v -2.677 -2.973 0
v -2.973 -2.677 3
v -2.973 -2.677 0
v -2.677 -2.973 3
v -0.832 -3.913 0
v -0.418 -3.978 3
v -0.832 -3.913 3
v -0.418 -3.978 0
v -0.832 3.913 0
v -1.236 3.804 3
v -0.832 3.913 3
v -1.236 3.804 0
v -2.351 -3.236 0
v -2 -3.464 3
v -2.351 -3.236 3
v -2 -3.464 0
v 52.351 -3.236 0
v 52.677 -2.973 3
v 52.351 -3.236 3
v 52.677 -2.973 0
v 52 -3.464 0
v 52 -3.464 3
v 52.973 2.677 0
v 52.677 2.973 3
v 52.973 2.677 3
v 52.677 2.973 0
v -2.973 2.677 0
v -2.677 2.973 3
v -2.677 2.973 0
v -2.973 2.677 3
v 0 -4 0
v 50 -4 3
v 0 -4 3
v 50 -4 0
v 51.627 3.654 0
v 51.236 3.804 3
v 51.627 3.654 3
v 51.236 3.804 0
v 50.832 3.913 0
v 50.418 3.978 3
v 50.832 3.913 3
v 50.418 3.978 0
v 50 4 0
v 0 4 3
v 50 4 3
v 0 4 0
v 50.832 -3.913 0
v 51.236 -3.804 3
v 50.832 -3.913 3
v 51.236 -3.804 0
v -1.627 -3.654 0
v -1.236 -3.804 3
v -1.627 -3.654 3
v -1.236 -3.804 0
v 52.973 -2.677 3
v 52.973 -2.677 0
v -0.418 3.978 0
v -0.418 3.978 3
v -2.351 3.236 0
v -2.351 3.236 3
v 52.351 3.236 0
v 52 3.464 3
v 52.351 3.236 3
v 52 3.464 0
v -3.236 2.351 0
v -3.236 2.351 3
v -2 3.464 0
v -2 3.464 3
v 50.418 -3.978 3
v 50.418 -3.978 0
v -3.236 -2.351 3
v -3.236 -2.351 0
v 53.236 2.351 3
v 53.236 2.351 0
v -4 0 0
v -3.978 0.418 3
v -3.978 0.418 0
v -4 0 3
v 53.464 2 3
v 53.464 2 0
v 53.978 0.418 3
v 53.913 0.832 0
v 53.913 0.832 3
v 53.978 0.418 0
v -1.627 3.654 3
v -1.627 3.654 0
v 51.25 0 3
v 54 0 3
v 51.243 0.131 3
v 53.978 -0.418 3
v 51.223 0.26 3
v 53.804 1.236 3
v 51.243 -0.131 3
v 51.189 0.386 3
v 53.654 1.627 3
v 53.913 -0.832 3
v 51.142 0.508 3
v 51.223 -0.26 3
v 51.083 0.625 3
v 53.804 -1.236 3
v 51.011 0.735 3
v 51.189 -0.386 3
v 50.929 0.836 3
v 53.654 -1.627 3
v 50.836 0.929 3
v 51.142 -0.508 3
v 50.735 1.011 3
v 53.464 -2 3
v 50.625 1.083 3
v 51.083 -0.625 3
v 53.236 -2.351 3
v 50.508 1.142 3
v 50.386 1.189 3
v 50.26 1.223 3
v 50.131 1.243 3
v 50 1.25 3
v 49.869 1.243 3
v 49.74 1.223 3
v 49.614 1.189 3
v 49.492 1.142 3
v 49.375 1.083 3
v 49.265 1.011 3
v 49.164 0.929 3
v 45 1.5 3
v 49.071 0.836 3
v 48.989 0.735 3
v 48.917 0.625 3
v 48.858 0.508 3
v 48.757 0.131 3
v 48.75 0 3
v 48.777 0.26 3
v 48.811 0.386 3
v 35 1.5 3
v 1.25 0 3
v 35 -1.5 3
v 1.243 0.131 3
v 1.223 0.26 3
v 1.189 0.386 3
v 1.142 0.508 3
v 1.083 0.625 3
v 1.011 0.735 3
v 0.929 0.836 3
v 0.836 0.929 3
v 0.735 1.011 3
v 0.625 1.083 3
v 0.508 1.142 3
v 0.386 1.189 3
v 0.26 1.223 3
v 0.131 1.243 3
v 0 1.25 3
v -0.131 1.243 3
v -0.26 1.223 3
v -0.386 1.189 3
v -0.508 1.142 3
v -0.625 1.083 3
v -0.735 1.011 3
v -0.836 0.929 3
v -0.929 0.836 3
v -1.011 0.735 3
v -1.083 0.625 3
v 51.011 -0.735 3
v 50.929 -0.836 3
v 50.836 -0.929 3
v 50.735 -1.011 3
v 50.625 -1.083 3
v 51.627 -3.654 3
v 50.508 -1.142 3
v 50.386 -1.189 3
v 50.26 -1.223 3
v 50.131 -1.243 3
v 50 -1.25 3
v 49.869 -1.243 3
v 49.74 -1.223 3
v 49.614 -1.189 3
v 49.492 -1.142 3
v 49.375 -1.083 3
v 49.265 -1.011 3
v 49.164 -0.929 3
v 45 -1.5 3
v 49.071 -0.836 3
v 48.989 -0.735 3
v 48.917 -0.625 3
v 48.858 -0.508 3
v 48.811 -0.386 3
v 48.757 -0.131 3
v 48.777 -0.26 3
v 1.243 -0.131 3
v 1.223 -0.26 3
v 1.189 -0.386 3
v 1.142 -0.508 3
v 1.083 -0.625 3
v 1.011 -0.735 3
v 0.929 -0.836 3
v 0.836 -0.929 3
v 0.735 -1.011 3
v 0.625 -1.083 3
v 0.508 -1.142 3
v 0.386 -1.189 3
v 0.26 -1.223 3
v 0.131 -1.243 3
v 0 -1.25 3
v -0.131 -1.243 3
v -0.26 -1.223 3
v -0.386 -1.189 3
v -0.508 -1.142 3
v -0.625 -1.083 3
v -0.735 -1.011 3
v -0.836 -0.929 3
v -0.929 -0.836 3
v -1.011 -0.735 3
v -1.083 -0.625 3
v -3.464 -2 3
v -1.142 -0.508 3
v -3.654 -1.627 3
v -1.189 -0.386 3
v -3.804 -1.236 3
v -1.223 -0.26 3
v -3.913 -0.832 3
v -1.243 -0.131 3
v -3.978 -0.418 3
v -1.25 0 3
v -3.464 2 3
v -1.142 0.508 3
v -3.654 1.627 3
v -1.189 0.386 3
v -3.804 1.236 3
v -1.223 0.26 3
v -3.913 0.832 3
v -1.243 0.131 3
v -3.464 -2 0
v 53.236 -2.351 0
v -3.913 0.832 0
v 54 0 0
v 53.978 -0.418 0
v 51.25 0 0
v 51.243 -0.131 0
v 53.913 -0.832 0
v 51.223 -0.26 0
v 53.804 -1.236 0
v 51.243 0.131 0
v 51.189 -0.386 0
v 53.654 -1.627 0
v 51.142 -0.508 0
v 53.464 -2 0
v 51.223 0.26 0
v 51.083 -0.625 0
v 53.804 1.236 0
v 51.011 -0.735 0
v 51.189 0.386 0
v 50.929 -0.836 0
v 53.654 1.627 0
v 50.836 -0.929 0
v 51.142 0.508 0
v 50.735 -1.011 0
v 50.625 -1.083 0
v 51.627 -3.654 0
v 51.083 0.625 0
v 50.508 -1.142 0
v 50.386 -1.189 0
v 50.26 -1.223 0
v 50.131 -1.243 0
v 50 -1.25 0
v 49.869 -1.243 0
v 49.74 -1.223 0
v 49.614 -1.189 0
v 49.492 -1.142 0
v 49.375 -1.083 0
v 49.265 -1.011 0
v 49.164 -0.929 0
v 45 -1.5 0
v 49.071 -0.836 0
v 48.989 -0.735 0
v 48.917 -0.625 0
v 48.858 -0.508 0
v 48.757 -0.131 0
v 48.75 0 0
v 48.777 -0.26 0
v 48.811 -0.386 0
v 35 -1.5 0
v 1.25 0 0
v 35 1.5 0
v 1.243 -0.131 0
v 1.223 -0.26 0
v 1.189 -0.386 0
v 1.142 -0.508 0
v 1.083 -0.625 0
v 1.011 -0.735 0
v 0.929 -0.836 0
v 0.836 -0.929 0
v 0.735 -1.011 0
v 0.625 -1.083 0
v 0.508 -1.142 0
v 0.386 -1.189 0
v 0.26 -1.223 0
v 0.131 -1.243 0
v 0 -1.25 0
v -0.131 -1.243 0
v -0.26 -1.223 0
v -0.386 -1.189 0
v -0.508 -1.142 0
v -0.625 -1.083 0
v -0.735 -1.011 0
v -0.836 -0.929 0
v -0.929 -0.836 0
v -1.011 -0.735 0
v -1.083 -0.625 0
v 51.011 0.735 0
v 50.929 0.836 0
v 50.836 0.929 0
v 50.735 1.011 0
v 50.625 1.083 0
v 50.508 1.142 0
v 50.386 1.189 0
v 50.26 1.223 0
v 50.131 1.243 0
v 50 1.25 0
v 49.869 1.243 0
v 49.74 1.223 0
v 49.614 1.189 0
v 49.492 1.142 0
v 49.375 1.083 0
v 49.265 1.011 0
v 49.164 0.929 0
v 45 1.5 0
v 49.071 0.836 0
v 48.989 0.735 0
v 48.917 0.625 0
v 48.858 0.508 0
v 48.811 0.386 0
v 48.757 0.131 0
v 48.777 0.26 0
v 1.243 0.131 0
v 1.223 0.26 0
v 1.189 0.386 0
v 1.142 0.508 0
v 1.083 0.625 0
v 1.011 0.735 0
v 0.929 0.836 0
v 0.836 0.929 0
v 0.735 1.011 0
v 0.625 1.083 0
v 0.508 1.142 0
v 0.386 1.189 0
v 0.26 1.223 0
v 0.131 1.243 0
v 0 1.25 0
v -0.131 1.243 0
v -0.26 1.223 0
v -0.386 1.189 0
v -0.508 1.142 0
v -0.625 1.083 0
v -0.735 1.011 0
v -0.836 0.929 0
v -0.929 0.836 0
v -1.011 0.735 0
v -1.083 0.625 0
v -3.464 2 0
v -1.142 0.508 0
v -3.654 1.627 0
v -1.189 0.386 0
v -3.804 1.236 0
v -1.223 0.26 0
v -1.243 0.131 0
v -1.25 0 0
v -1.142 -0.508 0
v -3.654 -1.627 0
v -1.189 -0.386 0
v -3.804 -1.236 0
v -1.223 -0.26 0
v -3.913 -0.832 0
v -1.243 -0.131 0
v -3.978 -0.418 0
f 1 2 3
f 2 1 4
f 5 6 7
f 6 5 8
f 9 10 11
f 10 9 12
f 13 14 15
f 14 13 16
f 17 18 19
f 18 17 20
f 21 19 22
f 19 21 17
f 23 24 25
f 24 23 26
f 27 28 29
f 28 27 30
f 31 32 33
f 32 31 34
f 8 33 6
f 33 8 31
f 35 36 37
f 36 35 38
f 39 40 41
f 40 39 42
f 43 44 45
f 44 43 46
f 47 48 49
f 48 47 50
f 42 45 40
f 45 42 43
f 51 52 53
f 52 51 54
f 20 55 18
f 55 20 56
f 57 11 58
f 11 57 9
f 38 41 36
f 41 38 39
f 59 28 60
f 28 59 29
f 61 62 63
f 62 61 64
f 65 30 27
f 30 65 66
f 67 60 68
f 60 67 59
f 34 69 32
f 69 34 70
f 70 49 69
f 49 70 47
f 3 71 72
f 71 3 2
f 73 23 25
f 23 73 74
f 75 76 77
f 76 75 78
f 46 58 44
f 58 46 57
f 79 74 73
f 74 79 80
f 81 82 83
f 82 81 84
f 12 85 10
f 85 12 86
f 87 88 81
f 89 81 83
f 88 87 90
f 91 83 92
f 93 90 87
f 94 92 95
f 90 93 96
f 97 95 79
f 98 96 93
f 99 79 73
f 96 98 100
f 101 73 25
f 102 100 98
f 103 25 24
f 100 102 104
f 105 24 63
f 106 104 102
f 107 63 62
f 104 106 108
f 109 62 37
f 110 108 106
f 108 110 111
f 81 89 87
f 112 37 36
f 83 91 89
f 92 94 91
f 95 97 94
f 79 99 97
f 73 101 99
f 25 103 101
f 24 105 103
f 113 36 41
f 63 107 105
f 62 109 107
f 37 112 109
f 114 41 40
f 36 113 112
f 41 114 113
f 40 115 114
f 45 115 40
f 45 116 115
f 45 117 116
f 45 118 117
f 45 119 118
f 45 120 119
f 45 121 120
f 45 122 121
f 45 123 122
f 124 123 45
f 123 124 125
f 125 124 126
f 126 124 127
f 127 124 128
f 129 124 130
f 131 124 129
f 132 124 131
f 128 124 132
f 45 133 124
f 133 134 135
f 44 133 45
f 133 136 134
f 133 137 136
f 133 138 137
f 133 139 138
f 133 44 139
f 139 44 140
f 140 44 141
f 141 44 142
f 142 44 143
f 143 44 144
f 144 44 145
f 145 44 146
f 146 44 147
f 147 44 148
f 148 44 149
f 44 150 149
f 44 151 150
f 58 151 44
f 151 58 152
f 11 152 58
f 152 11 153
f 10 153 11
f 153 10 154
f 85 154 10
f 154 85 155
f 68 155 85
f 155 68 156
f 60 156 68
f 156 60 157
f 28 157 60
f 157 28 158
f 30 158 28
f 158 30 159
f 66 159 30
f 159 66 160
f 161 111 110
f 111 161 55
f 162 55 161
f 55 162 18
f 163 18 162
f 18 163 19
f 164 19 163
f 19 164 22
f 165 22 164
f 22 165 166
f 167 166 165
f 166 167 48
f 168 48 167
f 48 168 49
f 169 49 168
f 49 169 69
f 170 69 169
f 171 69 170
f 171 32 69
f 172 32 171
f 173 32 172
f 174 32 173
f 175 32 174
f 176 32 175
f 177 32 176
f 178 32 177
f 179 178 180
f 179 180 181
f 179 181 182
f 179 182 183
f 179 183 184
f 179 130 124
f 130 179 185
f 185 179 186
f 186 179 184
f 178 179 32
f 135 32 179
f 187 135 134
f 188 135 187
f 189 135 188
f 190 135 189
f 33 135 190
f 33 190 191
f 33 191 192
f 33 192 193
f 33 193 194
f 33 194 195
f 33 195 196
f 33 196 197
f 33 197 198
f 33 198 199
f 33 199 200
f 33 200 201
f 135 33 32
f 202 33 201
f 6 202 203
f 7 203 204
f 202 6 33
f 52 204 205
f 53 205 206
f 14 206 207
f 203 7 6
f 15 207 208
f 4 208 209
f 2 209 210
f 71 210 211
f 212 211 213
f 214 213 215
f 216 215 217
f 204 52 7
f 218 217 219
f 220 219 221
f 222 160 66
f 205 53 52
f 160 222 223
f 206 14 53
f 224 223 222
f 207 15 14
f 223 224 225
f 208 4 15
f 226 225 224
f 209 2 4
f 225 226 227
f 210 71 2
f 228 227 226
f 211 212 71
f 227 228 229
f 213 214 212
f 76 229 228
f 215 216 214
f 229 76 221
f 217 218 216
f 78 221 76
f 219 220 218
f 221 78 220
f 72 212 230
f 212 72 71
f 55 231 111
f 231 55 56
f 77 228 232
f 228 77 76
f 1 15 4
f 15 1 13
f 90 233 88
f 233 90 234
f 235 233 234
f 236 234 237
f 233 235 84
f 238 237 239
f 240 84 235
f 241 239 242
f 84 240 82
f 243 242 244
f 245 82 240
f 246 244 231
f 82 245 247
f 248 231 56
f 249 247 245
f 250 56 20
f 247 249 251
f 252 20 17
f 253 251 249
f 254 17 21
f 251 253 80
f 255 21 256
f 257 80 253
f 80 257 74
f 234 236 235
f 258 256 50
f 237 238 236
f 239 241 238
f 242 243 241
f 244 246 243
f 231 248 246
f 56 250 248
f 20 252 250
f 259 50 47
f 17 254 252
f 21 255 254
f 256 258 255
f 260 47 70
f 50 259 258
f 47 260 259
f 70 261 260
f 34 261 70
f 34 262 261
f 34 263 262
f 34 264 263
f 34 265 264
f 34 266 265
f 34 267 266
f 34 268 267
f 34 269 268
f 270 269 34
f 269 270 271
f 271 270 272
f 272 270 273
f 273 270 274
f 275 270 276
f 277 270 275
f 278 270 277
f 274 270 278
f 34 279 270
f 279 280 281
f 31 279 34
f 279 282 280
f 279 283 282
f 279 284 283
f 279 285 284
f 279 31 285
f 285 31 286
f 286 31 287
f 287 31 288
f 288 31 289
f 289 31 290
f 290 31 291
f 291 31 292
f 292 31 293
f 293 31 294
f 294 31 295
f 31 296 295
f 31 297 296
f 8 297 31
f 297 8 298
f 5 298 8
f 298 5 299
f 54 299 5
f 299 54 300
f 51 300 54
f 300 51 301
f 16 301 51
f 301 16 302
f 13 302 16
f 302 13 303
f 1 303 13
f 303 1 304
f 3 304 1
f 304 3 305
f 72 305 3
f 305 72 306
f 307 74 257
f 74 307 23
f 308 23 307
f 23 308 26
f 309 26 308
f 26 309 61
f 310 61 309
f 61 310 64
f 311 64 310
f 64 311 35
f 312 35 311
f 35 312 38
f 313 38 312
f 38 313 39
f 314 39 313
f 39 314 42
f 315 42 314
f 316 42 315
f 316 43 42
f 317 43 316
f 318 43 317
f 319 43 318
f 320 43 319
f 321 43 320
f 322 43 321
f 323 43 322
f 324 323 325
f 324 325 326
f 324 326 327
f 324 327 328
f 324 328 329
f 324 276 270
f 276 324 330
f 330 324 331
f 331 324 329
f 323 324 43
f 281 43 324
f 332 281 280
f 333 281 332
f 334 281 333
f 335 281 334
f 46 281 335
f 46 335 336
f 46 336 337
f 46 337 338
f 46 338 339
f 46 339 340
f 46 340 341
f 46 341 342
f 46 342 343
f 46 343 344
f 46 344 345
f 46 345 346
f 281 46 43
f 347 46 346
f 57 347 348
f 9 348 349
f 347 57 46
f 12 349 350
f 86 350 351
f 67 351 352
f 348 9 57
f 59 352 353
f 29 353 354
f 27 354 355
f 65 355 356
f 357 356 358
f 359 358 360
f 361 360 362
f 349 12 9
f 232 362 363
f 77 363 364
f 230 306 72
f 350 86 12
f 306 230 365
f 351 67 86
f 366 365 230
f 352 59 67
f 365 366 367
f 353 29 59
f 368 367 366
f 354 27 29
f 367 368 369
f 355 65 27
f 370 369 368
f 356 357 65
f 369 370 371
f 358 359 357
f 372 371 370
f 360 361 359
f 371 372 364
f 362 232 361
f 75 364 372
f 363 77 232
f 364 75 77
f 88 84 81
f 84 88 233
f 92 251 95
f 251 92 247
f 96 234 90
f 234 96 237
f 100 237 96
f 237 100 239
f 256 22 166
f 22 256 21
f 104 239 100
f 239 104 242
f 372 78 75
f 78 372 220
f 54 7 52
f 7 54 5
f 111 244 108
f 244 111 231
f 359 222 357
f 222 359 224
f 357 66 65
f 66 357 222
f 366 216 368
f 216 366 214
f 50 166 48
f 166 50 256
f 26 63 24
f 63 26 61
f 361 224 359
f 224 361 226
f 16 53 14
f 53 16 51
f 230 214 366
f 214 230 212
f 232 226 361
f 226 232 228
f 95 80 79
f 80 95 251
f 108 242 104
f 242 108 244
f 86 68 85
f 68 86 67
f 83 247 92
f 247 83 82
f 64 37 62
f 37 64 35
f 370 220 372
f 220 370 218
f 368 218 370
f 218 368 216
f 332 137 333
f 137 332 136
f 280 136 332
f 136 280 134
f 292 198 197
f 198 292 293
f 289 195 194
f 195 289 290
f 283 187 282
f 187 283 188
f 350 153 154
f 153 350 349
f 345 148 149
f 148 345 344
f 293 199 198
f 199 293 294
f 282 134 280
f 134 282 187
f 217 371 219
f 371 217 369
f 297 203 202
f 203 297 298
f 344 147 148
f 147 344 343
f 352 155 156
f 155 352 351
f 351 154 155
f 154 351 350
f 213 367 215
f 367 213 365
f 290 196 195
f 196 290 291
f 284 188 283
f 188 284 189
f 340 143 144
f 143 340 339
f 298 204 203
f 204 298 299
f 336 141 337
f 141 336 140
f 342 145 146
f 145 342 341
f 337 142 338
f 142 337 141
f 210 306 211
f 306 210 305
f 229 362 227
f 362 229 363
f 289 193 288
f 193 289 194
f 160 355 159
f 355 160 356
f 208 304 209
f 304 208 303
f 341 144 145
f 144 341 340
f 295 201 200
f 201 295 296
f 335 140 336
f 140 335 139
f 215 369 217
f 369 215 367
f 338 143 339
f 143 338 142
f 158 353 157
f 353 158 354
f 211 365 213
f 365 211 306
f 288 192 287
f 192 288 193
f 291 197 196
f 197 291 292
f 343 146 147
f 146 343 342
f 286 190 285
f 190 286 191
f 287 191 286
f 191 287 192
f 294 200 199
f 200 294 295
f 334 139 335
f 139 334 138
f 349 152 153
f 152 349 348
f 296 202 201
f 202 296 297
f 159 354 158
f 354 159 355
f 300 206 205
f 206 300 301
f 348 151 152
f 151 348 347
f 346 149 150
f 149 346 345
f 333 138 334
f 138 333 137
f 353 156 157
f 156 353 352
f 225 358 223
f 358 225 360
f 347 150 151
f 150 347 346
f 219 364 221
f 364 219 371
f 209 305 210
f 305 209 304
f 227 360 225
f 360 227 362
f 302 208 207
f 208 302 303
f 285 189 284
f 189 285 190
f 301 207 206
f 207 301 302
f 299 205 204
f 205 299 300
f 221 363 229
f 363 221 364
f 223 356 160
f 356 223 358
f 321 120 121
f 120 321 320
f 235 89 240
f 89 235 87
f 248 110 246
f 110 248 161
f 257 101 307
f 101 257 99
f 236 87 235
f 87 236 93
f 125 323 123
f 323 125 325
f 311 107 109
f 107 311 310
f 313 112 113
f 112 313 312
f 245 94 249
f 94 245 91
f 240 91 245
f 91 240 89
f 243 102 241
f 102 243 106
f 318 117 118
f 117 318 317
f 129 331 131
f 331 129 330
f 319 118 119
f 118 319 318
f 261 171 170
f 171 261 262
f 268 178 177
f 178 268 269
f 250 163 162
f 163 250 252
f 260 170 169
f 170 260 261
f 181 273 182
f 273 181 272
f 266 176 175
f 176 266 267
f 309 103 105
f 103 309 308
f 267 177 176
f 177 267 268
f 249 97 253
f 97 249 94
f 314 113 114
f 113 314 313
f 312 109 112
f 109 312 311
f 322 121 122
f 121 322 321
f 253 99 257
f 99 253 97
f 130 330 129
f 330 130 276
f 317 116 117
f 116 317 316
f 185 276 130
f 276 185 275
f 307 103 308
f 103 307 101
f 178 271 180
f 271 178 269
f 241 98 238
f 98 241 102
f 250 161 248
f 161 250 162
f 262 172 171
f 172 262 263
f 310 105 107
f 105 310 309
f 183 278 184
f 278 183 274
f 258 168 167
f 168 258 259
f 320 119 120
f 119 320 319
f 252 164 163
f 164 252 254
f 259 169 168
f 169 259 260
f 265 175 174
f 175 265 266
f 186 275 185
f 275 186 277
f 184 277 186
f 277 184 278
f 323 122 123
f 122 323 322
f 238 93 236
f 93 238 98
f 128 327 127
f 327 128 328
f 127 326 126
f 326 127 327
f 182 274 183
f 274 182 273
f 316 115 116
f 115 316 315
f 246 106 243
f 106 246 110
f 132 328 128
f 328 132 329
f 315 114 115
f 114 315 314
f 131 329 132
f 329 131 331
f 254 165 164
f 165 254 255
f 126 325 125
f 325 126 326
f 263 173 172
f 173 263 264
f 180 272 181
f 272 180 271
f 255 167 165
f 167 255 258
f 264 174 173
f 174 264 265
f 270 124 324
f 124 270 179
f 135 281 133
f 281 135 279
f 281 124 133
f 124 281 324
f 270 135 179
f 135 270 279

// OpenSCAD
// file: parameters.scad
// =============================================================================
// Coil Winder - Common Parameters
// DTU 34621 Metal Detector Project
// =============================================================================

// -----------------------------------------------------------------------------
// Hardware Dimensions
// -----------------------------------------------------------------------------

// M8 Threaded Rod (Spindle)
spindle_dia = 8;
spindle_length = 300;

// 608ZZ Bearing (Skateboard bearing)
bearing_od = 22;
bearing_id = 8;
bearing_width = 7;

// M3 Hardware
m3_bolt_dia = 3.2;
m3_nut_dia = 6.4;
m3_nut_height = 2.4;
m3_head_dia = 5.5;
m3_head_height = 3;

// M8 Hardware
m8_nut_dia = 14.6;
m8_nut_height = 6.5;

// -----------------------------------------------------------------------------
// Servo Dimensions (SG90 / MG90S style)
// -----------------------------------------------------------------------------

servo_body_w = 23;
servo_body_h = 22.5;
servo_body_d = 12.5;
servo_tab_w = 32.5;
servo_tab_h = 2.5;
servo_tab_offset = 15.5;  // from bottom
servo_mount_hole_spacing = 28;
servo_shaft_offset = 5.5;  // from center of body
servo_horn_length = 15;

// -----------------------------------------------------------------------------
// ITR8307 Optical Sensor
// -----------------------------------------------------------------------------

itr8307_width = 10.8;
itr8307_depth = 5.2;
itr8307_height = 6.3;
itr8307_slot_width = 3;
itr8307_slot_depth = 4;

// -----------------------------------------------------------------------------
// Coil Dimensions
// -----------------------------------------------------------------------------

// TX Coil - 200mm diameter
tx_coil_dia = 200;
tx_coil_width = 18;
tx_coil_turns = 68;

// RX Coil - 80mm diameter
rx_coil_dia = 80;
rx_coil_width = 14;
rx_coil_turns = 170;

// Bucking Coil - 120mm diameter
buck_coil_dia = 120;
buck_coil_width = 18;
buck_coil_turns = 35;

// -----------------------------------------------------------------------------
// Frame Dimensions
// -----------------------------------------------------------------------------

base_length = 250;
base_width = 120;
base_thickness = 5;

bearing_mount_height = 40;
bearing_mount_width = 35;
bearing_mount_depth = 25;

// Distance between bearing centers
spindle_span = 200;

// -----------------------------------------------------------------------------
// Wire Guide / Traverse
// -----------------------------------------------------------------------------

guide_rail_length = 80;
guide_rail_width = 10;
guide_rail_height = 5;

carriage_width = 25;
carriage_depth = 20;
carriage_height = 15;

// -----------------------------------------------------------------------------
// Encoder Wheel
// -----------------------------------------------------------------------------

encoder_wheel_dia = 40;
encoder_wheel_thickness = 5;
encoder_slot_width = 5;
encoder_slot_depth = 12;

// -----------------------------------------------------------------------------
// General Tolerances
// -----------------------------------------------------------------------------

clearance = 0.3;        // General clearance for fitting parts
press_fit = 0.1;        // Tight fit
slide_fit = 0.4;        // Sliding fit

// -----------------------------------------------------------------------------
// Print Settings
// -----------------------------------------------------------------------------

wall_thickness = 2.4;   // 3 perimeters at 0.4mm nozzle
layer_height = 0.2;

$fn = 60;  // Circle resolution
// main file
// =============================================================================
// Push Rod - Connects servo horn to wire guide carriage
// =============================================================================

include <parameters.scad>

rod_length = 50;
rod_width = 8;
rod_thickness = 3;
hole_dia = 2.5;  // For M2 or wire pivot

module push_rod() {
    difference() {
        // Rod body
        hull() {
            cylinder(d=rod_width, h=rod_thickness);
            translate([rod_length, 0, 0])
                cylinder(d=rod_width, h=rod_thickness);
        }

        // Pivot holes
        translate([0, 0, -0.1])
            cylinder(d=hole_dia, h=rod_thickness + 0.2);
        translate([rod_length, 0, -0.1])
            cylinder(d=hole_dia, h=rod_thickness + 0.2);

        // Length adjustment slot (optional)
        translate([rod_length - 15, -1.5, -0.1])
            cube([10, 3, rod_thickness + 0.2]);
    }
}

// Render for export
push_rod();
